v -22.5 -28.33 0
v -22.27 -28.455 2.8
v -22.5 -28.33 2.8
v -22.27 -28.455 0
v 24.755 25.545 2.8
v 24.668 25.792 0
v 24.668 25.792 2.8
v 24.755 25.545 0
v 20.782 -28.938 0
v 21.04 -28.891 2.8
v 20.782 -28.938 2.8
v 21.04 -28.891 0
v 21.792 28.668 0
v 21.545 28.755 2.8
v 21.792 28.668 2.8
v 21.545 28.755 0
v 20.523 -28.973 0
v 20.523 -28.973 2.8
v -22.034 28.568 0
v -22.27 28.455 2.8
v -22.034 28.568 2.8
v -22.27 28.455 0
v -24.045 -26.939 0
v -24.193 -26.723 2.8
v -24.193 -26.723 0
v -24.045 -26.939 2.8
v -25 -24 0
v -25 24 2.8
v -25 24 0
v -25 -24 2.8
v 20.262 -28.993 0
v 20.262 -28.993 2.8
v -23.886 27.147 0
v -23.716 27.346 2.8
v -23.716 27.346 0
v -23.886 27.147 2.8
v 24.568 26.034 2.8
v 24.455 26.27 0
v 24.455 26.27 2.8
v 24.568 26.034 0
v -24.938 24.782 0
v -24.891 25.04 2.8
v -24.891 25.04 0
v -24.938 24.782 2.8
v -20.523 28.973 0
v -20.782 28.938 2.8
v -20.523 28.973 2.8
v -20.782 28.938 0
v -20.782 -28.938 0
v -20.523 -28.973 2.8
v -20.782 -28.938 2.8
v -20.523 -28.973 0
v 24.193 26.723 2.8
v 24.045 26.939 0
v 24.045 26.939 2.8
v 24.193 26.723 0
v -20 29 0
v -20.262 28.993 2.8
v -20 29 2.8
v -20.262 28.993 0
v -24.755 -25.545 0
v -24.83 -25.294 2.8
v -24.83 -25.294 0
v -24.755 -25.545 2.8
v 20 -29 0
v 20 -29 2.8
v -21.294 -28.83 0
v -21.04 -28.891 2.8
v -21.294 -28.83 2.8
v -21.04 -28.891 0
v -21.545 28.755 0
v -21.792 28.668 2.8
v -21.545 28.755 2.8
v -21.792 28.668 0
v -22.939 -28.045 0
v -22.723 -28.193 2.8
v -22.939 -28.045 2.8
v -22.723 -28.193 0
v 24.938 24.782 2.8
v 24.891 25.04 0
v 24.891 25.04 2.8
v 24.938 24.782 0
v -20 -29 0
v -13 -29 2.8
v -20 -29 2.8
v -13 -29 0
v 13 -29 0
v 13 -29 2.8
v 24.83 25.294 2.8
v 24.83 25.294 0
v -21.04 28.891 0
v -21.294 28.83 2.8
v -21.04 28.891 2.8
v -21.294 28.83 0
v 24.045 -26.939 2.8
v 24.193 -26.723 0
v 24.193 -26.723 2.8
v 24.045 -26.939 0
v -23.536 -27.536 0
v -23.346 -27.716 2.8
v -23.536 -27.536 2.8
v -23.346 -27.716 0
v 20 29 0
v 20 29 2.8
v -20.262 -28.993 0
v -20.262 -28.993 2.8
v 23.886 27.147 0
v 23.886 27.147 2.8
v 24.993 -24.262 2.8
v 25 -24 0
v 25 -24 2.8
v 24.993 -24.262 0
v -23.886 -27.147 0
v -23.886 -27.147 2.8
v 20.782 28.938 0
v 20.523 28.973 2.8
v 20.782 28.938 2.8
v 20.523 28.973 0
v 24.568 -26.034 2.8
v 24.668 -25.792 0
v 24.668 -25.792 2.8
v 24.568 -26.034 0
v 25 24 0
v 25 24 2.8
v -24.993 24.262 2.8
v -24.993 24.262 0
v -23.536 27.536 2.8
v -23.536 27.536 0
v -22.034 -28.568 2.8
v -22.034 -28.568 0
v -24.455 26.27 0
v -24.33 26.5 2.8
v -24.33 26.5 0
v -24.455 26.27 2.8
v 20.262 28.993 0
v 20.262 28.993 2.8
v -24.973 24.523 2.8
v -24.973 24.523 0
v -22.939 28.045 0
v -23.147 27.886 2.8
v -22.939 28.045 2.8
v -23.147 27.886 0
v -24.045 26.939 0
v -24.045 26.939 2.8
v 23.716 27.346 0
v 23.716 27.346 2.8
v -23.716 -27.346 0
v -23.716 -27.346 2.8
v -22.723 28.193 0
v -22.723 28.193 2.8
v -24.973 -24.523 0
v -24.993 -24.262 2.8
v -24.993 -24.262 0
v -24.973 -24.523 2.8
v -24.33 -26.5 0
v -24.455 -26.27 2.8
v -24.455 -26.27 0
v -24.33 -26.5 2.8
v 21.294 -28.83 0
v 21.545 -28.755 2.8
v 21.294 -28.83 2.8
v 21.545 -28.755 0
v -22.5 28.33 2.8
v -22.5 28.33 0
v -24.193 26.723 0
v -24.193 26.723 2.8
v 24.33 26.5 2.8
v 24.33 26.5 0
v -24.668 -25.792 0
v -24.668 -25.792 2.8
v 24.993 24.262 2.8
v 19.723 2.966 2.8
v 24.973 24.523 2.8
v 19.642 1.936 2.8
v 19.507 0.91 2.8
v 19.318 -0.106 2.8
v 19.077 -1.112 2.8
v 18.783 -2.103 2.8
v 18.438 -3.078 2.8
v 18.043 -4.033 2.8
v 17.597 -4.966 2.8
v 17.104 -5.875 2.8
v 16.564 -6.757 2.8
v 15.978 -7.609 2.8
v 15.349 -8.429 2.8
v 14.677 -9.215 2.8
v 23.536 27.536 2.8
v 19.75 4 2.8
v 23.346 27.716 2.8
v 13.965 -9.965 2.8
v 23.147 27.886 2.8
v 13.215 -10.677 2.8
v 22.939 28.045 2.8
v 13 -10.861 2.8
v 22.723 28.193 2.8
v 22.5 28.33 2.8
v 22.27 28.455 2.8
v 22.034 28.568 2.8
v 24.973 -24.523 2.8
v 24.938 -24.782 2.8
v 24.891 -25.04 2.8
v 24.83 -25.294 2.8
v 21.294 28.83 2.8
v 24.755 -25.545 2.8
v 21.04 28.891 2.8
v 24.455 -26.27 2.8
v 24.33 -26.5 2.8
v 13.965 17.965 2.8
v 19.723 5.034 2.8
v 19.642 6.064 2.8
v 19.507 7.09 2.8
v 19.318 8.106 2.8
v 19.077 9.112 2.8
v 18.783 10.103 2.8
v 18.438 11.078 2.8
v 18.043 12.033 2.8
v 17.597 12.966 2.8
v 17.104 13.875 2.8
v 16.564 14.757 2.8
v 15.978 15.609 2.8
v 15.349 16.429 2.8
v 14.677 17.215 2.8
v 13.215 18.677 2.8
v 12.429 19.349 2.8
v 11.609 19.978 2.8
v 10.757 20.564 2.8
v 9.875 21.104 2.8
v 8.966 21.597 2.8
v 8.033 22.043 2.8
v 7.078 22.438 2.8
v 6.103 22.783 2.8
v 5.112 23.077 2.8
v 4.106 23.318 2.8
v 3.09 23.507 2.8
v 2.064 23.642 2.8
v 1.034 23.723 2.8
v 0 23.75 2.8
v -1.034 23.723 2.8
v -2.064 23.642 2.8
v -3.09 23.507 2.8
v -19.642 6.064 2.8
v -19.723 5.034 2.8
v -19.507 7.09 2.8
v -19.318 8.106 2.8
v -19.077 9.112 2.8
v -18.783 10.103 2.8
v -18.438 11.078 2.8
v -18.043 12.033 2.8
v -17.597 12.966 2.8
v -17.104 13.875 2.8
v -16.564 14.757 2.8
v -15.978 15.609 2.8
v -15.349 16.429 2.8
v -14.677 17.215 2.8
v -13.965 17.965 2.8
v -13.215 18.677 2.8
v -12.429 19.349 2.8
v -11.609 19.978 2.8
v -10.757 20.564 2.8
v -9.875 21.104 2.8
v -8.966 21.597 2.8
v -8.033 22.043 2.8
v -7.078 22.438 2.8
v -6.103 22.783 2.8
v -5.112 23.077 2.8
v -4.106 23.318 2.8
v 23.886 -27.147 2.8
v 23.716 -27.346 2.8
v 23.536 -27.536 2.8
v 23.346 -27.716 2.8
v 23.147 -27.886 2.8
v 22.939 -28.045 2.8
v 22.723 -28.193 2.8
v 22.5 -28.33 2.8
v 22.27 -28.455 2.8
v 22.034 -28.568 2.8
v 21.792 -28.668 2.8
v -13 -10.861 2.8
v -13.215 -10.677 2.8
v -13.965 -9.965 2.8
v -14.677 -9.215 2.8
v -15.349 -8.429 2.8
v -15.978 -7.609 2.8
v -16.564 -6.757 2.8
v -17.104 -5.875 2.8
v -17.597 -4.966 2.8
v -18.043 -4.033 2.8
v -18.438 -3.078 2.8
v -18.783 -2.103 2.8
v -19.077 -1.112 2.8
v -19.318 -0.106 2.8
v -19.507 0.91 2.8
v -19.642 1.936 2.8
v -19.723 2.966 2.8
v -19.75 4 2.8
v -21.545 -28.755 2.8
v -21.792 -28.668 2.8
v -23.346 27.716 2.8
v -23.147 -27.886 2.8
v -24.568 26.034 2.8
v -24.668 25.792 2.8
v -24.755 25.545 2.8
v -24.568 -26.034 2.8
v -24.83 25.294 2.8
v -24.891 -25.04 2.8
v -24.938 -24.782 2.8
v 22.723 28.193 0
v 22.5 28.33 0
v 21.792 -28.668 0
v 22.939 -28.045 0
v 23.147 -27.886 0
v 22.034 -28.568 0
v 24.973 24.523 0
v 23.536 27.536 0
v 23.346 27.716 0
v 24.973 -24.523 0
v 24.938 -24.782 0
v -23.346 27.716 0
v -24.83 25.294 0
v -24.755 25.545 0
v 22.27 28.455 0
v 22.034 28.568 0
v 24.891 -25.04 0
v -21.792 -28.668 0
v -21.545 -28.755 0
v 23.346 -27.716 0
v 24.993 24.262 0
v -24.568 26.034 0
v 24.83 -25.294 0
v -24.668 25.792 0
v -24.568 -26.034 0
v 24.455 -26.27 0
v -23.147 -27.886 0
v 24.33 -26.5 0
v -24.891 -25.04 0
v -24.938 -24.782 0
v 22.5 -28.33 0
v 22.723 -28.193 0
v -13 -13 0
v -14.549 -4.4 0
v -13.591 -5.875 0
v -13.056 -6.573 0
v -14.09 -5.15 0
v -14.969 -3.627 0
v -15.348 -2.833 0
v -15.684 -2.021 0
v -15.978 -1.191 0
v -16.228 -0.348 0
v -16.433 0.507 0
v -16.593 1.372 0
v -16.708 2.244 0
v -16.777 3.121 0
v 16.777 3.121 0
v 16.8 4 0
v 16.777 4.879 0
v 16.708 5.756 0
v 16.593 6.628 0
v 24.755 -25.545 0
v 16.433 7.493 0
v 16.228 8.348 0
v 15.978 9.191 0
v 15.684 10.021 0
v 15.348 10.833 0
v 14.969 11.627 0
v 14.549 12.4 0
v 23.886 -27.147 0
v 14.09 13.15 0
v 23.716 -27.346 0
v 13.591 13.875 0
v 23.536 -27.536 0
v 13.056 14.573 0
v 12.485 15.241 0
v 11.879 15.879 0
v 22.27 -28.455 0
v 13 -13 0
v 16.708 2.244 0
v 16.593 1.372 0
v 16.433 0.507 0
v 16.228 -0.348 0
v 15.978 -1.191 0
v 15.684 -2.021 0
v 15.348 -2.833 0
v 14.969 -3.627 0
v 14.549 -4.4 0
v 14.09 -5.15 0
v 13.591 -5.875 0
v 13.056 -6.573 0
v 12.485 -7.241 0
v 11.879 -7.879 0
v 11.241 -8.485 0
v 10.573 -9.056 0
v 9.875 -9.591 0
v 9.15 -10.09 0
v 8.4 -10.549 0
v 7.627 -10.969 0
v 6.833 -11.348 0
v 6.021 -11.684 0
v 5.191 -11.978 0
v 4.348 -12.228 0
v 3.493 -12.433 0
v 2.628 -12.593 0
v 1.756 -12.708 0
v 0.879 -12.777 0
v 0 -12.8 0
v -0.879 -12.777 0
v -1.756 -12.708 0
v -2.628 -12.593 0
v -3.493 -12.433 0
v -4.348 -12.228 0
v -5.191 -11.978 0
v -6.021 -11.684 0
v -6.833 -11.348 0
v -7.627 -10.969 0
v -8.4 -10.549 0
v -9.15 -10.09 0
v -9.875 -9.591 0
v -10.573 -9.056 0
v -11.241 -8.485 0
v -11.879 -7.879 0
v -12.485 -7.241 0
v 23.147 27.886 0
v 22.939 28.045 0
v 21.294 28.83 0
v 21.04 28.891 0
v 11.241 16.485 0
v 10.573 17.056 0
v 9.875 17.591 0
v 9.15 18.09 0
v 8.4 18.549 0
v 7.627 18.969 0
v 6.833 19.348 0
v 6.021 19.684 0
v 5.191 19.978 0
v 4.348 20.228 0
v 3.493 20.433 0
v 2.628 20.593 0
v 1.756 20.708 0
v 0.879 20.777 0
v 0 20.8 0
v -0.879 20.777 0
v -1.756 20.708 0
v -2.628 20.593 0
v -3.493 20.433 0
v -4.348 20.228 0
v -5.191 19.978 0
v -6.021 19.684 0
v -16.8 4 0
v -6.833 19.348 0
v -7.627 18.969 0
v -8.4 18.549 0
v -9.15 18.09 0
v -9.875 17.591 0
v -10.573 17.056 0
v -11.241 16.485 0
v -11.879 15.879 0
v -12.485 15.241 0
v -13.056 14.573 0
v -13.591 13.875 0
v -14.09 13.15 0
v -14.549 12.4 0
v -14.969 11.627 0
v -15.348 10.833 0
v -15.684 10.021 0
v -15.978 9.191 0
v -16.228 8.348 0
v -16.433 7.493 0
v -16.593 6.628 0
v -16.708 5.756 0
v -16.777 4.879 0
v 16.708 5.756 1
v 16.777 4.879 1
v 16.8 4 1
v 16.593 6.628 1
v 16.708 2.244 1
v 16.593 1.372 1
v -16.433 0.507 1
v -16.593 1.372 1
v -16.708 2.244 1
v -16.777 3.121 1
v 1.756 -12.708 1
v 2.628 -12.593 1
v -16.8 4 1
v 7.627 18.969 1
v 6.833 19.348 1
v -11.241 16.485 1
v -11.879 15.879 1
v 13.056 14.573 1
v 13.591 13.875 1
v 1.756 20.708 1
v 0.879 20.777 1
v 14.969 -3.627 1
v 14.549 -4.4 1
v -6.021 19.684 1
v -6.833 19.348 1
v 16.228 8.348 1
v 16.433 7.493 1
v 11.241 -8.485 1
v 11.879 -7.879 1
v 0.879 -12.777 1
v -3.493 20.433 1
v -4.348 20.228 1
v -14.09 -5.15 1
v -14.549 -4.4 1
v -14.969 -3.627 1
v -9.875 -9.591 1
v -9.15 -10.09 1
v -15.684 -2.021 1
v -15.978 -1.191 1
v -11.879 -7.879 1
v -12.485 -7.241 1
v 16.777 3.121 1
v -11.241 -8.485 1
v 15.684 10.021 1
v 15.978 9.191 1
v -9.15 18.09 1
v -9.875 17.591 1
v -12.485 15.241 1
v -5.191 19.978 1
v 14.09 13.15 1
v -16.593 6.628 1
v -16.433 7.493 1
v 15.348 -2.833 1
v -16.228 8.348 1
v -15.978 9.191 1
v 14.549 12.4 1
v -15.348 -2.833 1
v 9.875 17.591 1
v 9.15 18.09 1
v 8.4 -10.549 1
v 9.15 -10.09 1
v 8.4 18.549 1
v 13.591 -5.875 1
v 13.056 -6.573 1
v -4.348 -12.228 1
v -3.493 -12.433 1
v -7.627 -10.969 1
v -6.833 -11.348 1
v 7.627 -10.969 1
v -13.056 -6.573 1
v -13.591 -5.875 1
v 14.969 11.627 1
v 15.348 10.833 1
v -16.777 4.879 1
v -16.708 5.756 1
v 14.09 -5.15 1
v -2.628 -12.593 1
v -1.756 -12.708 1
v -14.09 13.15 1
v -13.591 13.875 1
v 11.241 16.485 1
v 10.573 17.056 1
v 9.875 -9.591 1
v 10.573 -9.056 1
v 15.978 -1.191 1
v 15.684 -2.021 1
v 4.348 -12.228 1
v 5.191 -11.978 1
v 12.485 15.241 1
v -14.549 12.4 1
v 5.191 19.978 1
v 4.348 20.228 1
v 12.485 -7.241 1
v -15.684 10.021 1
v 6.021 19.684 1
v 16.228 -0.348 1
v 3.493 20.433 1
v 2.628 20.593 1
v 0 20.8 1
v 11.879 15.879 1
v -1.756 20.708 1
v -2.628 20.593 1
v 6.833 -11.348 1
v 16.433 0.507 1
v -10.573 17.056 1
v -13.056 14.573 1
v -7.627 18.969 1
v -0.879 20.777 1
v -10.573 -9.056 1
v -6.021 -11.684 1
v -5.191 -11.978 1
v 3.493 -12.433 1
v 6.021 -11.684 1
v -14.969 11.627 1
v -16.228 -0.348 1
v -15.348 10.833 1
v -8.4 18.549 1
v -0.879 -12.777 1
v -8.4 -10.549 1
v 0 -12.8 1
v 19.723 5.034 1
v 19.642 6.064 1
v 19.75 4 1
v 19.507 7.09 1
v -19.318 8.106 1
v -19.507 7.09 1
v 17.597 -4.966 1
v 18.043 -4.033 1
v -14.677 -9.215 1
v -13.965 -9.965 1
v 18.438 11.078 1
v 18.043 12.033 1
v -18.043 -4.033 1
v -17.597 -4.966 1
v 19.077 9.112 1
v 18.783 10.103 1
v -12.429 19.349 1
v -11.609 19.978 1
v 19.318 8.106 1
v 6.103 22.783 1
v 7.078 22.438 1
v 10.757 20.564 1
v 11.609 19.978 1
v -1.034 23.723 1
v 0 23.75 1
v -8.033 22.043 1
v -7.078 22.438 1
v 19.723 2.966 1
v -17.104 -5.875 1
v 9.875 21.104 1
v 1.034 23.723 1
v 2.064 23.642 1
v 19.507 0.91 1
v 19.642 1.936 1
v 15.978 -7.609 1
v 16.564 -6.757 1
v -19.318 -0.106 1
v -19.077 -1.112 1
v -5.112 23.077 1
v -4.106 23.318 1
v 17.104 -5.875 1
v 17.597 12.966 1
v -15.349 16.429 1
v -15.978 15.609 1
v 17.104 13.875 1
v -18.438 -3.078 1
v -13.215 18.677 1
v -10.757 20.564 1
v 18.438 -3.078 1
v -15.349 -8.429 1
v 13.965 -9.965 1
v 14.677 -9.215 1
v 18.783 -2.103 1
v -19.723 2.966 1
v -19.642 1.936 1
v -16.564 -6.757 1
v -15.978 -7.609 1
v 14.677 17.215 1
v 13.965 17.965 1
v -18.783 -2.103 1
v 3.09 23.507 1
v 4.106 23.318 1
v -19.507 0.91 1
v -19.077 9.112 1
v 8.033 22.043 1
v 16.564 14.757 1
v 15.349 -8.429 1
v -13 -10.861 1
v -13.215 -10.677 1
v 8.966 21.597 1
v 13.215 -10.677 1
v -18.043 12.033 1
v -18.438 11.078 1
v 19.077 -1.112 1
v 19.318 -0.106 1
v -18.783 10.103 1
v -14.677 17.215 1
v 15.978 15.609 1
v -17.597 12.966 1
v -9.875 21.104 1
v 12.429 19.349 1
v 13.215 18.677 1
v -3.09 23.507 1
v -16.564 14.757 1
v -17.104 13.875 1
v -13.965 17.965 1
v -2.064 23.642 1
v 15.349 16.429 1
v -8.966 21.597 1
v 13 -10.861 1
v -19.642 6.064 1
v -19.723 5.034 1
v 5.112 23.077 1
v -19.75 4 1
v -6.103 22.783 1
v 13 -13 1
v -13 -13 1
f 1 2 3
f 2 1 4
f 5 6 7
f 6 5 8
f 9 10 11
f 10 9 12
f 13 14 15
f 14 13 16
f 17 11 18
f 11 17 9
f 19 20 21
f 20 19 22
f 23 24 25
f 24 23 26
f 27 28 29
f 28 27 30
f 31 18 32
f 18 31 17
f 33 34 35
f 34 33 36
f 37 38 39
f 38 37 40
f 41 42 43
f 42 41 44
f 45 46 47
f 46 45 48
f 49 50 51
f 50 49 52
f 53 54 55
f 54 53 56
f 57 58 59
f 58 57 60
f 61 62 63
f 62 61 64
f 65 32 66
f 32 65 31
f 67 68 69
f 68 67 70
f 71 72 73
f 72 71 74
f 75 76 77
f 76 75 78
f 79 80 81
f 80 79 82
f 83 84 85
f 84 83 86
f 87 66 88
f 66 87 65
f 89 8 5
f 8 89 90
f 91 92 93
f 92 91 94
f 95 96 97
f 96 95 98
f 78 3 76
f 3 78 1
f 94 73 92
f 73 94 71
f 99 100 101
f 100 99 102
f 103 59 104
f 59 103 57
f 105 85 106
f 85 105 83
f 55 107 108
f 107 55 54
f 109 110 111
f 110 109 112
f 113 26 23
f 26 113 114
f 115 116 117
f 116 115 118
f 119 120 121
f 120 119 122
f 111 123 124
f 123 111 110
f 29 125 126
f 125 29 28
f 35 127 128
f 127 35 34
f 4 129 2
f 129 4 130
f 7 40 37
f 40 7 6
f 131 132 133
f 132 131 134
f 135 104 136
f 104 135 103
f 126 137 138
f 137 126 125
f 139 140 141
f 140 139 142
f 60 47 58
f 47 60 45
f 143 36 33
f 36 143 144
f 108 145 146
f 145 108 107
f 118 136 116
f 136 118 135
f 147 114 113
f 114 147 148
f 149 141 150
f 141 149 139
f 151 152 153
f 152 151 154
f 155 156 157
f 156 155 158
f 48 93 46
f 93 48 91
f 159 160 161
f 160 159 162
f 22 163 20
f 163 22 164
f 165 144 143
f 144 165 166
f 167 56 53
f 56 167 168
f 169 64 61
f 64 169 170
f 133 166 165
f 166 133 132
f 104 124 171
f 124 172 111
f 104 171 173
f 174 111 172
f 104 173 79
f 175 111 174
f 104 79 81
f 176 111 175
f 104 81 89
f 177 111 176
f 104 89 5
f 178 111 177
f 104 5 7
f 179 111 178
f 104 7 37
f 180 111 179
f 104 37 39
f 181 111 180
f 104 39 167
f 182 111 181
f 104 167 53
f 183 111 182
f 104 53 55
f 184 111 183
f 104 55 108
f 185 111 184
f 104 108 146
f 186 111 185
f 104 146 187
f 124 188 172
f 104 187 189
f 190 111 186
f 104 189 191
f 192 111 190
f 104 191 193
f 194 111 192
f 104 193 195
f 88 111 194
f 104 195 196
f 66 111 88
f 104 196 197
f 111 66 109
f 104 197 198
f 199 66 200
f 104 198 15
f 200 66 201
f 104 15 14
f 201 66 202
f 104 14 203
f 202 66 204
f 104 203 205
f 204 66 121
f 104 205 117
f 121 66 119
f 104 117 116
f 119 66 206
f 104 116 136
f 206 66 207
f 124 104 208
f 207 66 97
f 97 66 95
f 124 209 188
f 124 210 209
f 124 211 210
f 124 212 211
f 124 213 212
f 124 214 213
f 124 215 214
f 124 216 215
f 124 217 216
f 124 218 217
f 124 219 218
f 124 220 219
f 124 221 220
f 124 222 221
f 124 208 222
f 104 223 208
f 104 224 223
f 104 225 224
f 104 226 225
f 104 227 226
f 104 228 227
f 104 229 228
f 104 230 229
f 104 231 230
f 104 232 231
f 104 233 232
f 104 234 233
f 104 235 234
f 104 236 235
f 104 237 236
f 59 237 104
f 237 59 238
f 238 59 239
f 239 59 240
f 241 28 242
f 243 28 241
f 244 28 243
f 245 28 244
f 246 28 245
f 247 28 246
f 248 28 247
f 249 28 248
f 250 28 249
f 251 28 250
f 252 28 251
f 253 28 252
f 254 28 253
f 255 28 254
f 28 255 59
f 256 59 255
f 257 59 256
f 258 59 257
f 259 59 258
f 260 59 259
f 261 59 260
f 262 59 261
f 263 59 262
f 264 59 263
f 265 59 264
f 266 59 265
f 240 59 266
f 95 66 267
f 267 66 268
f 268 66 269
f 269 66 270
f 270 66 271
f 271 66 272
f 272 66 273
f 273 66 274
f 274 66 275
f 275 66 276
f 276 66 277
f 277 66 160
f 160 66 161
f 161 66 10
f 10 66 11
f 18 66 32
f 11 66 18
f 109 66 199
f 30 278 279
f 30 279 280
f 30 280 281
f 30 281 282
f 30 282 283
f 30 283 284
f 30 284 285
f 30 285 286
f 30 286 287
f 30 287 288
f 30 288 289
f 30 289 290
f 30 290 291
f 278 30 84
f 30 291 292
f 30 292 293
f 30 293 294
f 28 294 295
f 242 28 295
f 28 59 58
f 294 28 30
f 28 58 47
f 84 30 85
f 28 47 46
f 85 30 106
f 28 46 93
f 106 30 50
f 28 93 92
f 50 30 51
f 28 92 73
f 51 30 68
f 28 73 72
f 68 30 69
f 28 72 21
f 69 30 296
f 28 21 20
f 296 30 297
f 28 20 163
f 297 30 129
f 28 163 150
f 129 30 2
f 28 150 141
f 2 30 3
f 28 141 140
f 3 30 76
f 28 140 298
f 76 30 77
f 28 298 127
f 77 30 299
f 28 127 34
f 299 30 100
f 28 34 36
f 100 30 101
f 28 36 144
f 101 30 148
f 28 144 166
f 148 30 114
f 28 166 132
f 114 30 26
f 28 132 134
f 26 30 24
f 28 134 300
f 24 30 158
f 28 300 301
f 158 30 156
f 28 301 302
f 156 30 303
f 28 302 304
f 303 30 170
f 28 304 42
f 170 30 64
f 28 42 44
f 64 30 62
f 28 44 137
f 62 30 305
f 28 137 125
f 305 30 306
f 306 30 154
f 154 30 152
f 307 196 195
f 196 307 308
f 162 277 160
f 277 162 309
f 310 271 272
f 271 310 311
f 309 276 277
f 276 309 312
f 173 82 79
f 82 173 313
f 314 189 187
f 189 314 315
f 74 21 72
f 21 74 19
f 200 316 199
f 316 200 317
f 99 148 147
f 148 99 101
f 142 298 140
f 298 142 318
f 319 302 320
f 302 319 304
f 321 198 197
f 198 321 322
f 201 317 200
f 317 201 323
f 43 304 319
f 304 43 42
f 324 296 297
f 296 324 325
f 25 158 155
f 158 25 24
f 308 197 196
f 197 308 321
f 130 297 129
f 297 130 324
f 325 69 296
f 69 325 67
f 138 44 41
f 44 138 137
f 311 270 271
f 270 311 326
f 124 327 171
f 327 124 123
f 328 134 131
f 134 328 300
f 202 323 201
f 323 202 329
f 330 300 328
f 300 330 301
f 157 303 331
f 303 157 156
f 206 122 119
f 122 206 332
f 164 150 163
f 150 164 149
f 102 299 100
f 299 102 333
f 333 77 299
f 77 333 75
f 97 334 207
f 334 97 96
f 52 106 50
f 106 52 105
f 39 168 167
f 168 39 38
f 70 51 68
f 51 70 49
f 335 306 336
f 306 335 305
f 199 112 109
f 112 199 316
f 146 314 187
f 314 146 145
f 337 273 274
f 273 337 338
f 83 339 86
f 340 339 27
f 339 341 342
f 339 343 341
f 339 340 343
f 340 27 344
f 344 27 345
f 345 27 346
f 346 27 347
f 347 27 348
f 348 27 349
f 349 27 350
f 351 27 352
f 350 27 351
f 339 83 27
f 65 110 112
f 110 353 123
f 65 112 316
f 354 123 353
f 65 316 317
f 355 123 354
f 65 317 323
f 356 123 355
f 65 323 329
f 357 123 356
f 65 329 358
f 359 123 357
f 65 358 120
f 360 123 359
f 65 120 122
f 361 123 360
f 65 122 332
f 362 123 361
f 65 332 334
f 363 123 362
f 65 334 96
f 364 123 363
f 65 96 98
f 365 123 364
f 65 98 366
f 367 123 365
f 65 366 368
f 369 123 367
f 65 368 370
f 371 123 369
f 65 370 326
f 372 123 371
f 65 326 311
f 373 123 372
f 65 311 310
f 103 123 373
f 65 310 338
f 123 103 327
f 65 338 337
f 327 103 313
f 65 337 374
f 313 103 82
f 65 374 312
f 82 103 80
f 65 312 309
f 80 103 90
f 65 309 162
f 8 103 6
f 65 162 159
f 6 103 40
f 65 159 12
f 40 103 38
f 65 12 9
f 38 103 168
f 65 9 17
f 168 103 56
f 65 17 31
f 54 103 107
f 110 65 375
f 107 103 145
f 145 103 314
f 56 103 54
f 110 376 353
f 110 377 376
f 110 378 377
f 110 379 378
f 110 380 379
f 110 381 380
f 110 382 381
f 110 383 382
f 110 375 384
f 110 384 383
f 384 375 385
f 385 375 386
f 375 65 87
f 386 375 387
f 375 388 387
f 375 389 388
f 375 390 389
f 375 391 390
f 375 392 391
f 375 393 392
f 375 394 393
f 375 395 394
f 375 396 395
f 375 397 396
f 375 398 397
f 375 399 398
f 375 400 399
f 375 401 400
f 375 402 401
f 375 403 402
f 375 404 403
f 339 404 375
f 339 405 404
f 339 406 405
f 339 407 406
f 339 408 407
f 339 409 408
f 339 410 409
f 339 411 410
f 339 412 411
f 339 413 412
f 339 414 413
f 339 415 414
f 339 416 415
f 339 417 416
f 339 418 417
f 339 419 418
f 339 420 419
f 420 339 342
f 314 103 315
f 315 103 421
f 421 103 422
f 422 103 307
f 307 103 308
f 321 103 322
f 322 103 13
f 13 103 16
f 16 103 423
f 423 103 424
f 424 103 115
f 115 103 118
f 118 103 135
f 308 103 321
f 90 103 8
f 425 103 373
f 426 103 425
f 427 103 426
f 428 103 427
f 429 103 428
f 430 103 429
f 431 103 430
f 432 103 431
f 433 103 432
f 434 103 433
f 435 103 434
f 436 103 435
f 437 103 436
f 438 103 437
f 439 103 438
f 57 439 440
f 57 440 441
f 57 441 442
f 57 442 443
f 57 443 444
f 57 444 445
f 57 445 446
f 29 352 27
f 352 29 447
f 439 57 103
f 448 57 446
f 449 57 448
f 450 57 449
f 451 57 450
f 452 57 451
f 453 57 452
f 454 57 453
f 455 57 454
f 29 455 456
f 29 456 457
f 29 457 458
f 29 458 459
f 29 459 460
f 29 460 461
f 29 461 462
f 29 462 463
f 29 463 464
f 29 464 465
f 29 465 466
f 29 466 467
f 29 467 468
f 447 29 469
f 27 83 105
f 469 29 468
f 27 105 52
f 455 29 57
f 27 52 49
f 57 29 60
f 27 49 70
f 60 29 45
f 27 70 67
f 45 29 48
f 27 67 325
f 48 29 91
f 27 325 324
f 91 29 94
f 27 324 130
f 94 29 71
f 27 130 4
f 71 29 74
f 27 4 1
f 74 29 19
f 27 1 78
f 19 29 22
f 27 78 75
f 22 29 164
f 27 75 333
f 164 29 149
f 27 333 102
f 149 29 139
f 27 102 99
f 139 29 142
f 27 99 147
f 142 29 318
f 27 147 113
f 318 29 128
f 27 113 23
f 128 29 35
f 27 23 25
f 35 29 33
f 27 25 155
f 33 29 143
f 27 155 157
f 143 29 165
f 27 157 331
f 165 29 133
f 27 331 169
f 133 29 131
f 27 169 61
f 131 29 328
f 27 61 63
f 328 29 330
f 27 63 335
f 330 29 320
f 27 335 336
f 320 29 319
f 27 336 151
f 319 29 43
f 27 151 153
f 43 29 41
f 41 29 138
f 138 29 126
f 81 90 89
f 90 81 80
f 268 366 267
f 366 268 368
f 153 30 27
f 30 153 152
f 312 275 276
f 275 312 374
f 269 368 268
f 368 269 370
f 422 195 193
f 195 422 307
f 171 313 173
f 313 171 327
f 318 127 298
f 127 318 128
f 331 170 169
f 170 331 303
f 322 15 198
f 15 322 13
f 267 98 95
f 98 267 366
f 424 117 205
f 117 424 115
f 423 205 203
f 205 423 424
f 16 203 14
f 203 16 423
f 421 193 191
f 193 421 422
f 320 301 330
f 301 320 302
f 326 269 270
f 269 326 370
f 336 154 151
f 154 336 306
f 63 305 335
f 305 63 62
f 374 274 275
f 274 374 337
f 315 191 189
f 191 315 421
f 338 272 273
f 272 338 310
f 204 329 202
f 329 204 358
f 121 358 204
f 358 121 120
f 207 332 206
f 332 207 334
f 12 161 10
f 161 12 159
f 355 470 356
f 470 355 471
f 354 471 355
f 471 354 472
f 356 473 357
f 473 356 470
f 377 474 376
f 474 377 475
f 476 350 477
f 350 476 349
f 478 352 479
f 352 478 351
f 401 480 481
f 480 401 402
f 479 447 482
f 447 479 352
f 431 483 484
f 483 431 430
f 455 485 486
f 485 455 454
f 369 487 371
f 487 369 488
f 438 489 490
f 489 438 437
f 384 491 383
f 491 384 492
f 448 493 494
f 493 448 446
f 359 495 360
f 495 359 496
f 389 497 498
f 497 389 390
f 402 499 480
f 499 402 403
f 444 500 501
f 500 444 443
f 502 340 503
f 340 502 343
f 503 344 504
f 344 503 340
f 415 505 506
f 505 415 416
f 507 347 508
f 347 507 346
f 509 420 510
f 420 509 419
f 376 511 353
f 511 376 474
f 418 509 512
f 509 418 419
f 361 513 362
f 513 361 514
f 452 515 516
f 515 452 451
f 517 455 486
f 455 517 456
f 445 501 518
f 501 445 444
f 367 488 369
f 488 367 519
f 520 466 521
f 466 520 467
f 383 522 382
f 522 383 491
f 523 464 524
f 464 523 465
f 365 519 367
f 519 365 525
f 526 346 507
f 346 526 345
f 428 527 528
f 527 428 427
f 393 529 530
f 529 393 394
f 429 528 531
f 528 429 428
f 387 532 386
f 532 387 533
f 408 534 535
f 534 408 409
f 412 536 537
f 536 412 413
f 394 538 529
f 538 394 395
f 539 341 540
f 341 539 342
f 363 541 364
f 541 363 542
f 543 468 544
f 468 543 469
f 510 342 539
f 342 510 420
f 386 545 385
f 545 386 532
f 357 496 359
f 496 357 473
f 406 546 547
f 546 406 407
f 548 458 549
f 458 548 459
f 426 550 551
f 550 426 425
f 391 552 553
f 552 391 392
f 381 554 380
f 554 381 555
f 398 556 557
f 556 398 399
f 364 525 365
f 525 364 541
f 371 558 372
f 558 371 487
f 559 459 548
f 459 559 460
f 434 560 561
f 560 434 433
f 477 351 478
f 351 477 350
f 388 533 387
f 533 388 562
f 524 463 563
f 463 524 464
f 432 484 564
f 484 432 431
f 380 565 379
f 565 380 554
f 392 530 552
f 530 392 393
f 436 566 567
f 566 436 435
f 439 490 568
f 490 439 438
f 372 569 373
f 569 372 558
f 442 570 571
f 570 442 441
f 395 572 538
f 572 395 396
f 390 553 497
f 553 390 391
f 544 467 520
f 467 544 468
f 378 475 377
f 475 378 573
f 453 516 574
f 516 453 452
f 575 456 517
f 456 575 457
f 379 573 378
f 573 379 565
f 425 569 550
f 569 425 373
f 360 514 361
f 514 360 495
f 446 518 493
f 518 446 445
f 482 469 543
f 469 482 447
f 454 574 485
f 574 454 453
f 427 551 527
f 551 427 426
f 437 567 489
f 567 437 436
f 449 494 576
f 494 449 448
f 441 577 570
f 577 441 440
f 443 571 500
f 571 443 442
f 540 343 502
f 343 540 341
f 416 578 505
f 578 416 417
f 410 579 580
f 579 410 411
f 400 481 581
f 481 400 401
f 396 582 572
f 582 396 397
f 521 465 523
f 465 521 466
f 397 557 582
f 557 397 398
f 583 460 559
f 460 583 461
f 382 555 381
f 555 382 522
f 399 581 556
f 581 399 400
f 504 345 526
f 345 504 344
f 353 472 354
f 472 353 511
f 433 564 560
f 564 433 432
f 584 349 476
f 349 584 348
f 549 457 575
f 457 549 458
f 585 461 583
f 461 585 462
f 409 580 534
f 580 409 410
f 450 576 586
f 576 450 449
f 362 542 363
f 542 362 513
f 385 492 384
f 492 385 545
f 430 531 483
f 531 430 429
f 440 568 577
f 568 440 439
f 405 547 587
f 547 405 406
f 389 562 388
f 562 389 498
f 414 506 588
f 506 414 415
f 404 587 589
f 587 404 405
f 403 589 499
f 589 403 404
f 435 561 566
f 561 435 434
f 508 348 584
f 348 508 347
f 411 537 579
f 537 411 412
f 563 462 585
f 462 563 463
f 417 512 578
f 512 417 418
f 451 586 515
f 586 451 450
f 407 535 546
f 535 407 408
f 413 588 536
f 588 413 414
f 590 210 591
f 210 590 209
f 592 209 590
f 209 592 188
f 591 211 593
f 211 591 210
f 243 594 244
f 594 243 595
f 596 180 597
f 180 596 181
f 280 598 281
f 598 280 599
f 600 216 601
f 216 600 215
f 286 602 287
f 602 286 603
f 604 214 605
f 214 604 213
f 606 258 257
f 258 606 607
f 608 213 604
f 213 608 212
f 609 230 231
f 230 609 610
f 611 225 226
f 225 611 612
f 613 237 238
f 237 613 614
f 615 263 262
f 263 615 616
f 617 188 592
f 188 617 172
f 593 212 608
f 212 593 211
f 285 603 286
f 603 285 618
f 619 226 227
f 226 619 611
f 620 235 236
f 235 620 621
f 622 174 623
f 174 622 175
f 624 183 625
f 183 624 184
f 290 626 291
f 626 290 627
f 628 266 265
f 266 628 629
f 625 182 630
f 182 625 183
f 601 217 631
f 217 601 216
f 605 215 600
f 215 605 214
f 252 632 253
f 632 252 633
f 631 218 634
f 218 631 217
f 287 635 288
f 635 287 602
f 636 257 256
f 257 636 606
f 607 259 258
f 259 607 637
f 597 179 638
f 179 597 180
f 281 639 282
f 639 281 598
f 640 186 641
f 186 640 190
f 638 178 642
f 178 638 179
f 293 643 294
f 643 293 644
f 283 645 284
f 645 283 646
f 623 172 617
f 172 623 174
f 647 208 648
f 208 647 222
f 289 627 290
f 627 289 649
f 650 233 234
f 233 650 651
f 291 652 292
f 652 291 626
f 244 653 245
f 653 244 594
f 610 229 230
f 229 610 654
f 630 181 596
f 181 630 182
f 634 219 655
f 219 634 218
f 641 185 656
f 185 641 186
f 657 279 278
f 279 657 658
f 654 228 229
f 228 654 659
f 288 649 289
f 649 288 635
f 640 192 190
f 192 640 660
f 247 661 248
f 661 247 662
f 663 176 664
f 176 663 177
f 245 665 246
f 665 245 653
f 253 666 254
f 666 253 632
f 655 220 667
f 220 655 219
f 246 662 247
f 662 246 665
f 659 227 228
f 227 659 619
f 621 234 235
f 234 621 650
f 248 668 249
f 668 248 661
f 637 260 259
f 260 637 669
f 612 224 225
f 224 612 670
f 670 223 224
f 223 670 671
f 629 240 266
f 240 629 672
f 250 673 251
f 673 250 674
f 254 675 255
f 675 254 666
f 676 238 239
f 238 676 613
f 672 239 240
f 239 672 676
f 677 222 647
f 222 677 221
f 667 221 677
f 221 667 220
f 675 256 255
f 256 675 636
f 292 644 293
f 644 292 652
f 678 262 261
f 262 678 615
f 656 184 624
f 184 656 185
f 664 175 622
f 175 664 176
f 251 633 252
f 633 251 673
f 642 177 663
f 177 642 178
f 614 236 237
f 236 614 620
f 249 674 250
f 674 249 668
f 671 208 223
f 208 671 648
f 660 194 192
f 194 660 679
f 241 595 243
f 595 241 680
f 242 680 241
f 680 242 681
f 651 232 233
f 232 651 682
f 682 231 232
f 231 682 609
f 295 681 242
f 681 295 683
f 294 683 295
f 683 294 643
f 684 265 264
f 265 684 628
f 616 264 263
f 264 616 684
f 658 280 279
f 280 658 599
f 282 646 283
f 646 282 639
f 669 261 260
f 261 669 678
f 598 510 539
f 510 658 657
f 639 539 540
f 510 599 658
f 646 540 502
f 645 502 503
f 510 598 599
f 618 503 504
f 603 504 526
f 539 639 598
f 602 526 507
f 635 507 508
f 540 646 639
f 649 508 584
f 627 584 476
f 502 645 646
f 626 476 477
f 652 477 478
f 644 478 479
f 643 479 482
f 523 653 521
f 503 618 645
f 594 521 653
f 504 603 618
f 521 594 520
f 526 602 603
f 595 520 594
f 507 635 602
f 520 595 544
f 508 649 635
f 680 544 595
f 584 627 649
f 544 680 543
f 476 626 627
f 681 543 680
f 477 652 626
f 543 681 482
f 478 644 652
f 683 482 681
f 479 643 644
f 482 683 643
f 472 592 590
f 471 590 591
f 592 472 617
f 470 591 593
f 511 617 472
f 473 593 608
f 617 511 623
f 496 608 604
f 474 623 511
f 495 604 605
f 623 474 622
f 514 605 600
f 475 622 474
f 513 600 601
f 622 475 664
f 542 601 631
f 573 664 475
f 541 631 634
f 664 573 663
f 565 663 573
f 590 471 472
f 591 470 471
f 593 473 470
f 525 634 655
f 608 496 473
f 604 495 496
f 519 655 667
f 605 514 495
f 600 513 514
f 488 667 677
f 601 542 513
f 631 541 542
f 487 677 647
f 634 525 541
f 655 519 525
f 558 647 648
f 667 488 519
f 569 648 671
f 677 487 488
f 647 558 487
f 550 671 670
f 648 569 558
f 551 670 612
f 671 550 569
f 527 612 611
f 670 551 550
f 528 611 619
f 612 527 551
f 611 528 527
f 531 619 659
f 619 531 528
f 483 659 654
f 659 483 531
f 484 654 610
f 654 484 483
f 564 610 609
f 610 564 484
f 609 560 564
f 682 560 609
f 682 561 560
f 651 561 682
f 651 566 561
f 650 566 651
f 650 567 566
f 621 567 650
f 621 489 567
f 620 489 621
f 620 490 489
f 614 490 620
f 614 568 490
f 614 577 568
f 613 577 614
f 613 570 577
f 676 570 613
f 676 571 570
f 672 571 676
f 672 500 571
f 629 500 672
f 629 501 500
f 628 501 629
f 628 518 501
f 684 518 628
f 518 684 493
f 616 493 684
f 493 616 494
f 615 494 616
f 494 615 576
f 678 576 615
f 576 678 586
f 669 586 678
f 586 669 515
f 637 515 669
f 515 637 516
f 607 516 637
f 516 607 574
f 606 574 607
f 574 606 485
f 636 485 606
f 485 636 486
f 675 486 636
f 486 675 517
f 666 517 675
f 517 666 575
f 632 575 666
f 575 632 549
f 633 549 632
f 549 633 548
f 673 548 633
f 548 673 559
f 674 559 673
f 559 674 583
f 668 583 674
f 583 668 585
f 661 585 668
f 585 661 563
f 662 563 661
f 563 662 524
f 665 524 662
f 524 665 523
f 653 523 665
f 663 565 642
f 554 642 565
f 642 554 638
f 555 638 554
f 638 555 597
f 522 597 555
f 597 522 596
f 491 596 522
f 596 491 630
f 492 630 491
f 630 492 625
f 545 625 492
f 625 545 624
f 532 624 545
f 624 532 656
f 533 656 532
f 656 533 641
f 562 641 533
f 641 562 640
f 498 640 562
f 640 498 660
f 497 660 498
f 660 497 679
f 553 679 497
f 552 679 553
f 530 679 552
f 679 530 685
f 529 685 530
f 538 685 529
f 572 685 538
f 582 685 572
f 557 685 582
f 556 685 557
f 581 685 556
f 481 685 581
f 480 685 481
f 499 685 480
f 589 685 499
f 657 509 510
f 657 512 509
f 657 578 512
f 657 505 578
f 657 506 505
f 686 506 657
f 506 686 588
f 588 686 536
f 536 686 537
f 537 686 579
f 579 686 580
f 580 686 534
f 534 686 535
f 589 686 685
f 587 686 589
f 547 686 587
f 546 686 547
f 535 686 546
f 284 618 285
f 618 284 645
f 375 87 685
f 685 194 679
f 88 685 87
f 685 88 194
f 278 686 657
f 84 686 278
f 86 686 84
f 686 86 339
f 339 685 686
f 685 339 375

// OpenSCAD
// XWiz Flight Tracker V0.9 - preliminary fit gauges, mm
// Set part to "display" or "board", F6, export STL.
part = "display";
$fn = 120;
board_w = 30.5;
board_l = 72;
board_frame = 3;
board_z = 2.4;
display_pocket = 39.5;
display_opening = 33.6;
display_z = 2.8;
lip = 1.0;
tab_w = 26;
module board_gauge() {
  difference() {
    linear_extrude(board_z) offset(r=2) offset(delta=-2)
      square([board_w+2*board_frame,board_l+2*board_frame],center=true);
    translate([0,0,-.1]) linear_extrude(board_z+.2)
      square([board_w,board_l],center=true);
  }
}
module display_gauge() {
  difference() {
    linear_extrude(display_z) offset(r=5) offset(delta=-5)
      square([50,58],center=true);
    translate([0,4,-.1]) cylinder(d=display_opening,h=display_z+.2);
    translate([0,4,lip]) cylinder(d=display_pocket,h=display_z-lip+.1);
    // Open relief for the connector tab and solder joints, away from the glass.
    translate([-tab_w/2,-30,-.1]) cube([tab_w,17,display_z+.2]);
    translate([-tab_w/2,-13,lip]) cube([tab_w,6,display_z-lip+.1]);
  }
}
if(part=="display") display_gauge();
if(part=="board") board_gauge();
